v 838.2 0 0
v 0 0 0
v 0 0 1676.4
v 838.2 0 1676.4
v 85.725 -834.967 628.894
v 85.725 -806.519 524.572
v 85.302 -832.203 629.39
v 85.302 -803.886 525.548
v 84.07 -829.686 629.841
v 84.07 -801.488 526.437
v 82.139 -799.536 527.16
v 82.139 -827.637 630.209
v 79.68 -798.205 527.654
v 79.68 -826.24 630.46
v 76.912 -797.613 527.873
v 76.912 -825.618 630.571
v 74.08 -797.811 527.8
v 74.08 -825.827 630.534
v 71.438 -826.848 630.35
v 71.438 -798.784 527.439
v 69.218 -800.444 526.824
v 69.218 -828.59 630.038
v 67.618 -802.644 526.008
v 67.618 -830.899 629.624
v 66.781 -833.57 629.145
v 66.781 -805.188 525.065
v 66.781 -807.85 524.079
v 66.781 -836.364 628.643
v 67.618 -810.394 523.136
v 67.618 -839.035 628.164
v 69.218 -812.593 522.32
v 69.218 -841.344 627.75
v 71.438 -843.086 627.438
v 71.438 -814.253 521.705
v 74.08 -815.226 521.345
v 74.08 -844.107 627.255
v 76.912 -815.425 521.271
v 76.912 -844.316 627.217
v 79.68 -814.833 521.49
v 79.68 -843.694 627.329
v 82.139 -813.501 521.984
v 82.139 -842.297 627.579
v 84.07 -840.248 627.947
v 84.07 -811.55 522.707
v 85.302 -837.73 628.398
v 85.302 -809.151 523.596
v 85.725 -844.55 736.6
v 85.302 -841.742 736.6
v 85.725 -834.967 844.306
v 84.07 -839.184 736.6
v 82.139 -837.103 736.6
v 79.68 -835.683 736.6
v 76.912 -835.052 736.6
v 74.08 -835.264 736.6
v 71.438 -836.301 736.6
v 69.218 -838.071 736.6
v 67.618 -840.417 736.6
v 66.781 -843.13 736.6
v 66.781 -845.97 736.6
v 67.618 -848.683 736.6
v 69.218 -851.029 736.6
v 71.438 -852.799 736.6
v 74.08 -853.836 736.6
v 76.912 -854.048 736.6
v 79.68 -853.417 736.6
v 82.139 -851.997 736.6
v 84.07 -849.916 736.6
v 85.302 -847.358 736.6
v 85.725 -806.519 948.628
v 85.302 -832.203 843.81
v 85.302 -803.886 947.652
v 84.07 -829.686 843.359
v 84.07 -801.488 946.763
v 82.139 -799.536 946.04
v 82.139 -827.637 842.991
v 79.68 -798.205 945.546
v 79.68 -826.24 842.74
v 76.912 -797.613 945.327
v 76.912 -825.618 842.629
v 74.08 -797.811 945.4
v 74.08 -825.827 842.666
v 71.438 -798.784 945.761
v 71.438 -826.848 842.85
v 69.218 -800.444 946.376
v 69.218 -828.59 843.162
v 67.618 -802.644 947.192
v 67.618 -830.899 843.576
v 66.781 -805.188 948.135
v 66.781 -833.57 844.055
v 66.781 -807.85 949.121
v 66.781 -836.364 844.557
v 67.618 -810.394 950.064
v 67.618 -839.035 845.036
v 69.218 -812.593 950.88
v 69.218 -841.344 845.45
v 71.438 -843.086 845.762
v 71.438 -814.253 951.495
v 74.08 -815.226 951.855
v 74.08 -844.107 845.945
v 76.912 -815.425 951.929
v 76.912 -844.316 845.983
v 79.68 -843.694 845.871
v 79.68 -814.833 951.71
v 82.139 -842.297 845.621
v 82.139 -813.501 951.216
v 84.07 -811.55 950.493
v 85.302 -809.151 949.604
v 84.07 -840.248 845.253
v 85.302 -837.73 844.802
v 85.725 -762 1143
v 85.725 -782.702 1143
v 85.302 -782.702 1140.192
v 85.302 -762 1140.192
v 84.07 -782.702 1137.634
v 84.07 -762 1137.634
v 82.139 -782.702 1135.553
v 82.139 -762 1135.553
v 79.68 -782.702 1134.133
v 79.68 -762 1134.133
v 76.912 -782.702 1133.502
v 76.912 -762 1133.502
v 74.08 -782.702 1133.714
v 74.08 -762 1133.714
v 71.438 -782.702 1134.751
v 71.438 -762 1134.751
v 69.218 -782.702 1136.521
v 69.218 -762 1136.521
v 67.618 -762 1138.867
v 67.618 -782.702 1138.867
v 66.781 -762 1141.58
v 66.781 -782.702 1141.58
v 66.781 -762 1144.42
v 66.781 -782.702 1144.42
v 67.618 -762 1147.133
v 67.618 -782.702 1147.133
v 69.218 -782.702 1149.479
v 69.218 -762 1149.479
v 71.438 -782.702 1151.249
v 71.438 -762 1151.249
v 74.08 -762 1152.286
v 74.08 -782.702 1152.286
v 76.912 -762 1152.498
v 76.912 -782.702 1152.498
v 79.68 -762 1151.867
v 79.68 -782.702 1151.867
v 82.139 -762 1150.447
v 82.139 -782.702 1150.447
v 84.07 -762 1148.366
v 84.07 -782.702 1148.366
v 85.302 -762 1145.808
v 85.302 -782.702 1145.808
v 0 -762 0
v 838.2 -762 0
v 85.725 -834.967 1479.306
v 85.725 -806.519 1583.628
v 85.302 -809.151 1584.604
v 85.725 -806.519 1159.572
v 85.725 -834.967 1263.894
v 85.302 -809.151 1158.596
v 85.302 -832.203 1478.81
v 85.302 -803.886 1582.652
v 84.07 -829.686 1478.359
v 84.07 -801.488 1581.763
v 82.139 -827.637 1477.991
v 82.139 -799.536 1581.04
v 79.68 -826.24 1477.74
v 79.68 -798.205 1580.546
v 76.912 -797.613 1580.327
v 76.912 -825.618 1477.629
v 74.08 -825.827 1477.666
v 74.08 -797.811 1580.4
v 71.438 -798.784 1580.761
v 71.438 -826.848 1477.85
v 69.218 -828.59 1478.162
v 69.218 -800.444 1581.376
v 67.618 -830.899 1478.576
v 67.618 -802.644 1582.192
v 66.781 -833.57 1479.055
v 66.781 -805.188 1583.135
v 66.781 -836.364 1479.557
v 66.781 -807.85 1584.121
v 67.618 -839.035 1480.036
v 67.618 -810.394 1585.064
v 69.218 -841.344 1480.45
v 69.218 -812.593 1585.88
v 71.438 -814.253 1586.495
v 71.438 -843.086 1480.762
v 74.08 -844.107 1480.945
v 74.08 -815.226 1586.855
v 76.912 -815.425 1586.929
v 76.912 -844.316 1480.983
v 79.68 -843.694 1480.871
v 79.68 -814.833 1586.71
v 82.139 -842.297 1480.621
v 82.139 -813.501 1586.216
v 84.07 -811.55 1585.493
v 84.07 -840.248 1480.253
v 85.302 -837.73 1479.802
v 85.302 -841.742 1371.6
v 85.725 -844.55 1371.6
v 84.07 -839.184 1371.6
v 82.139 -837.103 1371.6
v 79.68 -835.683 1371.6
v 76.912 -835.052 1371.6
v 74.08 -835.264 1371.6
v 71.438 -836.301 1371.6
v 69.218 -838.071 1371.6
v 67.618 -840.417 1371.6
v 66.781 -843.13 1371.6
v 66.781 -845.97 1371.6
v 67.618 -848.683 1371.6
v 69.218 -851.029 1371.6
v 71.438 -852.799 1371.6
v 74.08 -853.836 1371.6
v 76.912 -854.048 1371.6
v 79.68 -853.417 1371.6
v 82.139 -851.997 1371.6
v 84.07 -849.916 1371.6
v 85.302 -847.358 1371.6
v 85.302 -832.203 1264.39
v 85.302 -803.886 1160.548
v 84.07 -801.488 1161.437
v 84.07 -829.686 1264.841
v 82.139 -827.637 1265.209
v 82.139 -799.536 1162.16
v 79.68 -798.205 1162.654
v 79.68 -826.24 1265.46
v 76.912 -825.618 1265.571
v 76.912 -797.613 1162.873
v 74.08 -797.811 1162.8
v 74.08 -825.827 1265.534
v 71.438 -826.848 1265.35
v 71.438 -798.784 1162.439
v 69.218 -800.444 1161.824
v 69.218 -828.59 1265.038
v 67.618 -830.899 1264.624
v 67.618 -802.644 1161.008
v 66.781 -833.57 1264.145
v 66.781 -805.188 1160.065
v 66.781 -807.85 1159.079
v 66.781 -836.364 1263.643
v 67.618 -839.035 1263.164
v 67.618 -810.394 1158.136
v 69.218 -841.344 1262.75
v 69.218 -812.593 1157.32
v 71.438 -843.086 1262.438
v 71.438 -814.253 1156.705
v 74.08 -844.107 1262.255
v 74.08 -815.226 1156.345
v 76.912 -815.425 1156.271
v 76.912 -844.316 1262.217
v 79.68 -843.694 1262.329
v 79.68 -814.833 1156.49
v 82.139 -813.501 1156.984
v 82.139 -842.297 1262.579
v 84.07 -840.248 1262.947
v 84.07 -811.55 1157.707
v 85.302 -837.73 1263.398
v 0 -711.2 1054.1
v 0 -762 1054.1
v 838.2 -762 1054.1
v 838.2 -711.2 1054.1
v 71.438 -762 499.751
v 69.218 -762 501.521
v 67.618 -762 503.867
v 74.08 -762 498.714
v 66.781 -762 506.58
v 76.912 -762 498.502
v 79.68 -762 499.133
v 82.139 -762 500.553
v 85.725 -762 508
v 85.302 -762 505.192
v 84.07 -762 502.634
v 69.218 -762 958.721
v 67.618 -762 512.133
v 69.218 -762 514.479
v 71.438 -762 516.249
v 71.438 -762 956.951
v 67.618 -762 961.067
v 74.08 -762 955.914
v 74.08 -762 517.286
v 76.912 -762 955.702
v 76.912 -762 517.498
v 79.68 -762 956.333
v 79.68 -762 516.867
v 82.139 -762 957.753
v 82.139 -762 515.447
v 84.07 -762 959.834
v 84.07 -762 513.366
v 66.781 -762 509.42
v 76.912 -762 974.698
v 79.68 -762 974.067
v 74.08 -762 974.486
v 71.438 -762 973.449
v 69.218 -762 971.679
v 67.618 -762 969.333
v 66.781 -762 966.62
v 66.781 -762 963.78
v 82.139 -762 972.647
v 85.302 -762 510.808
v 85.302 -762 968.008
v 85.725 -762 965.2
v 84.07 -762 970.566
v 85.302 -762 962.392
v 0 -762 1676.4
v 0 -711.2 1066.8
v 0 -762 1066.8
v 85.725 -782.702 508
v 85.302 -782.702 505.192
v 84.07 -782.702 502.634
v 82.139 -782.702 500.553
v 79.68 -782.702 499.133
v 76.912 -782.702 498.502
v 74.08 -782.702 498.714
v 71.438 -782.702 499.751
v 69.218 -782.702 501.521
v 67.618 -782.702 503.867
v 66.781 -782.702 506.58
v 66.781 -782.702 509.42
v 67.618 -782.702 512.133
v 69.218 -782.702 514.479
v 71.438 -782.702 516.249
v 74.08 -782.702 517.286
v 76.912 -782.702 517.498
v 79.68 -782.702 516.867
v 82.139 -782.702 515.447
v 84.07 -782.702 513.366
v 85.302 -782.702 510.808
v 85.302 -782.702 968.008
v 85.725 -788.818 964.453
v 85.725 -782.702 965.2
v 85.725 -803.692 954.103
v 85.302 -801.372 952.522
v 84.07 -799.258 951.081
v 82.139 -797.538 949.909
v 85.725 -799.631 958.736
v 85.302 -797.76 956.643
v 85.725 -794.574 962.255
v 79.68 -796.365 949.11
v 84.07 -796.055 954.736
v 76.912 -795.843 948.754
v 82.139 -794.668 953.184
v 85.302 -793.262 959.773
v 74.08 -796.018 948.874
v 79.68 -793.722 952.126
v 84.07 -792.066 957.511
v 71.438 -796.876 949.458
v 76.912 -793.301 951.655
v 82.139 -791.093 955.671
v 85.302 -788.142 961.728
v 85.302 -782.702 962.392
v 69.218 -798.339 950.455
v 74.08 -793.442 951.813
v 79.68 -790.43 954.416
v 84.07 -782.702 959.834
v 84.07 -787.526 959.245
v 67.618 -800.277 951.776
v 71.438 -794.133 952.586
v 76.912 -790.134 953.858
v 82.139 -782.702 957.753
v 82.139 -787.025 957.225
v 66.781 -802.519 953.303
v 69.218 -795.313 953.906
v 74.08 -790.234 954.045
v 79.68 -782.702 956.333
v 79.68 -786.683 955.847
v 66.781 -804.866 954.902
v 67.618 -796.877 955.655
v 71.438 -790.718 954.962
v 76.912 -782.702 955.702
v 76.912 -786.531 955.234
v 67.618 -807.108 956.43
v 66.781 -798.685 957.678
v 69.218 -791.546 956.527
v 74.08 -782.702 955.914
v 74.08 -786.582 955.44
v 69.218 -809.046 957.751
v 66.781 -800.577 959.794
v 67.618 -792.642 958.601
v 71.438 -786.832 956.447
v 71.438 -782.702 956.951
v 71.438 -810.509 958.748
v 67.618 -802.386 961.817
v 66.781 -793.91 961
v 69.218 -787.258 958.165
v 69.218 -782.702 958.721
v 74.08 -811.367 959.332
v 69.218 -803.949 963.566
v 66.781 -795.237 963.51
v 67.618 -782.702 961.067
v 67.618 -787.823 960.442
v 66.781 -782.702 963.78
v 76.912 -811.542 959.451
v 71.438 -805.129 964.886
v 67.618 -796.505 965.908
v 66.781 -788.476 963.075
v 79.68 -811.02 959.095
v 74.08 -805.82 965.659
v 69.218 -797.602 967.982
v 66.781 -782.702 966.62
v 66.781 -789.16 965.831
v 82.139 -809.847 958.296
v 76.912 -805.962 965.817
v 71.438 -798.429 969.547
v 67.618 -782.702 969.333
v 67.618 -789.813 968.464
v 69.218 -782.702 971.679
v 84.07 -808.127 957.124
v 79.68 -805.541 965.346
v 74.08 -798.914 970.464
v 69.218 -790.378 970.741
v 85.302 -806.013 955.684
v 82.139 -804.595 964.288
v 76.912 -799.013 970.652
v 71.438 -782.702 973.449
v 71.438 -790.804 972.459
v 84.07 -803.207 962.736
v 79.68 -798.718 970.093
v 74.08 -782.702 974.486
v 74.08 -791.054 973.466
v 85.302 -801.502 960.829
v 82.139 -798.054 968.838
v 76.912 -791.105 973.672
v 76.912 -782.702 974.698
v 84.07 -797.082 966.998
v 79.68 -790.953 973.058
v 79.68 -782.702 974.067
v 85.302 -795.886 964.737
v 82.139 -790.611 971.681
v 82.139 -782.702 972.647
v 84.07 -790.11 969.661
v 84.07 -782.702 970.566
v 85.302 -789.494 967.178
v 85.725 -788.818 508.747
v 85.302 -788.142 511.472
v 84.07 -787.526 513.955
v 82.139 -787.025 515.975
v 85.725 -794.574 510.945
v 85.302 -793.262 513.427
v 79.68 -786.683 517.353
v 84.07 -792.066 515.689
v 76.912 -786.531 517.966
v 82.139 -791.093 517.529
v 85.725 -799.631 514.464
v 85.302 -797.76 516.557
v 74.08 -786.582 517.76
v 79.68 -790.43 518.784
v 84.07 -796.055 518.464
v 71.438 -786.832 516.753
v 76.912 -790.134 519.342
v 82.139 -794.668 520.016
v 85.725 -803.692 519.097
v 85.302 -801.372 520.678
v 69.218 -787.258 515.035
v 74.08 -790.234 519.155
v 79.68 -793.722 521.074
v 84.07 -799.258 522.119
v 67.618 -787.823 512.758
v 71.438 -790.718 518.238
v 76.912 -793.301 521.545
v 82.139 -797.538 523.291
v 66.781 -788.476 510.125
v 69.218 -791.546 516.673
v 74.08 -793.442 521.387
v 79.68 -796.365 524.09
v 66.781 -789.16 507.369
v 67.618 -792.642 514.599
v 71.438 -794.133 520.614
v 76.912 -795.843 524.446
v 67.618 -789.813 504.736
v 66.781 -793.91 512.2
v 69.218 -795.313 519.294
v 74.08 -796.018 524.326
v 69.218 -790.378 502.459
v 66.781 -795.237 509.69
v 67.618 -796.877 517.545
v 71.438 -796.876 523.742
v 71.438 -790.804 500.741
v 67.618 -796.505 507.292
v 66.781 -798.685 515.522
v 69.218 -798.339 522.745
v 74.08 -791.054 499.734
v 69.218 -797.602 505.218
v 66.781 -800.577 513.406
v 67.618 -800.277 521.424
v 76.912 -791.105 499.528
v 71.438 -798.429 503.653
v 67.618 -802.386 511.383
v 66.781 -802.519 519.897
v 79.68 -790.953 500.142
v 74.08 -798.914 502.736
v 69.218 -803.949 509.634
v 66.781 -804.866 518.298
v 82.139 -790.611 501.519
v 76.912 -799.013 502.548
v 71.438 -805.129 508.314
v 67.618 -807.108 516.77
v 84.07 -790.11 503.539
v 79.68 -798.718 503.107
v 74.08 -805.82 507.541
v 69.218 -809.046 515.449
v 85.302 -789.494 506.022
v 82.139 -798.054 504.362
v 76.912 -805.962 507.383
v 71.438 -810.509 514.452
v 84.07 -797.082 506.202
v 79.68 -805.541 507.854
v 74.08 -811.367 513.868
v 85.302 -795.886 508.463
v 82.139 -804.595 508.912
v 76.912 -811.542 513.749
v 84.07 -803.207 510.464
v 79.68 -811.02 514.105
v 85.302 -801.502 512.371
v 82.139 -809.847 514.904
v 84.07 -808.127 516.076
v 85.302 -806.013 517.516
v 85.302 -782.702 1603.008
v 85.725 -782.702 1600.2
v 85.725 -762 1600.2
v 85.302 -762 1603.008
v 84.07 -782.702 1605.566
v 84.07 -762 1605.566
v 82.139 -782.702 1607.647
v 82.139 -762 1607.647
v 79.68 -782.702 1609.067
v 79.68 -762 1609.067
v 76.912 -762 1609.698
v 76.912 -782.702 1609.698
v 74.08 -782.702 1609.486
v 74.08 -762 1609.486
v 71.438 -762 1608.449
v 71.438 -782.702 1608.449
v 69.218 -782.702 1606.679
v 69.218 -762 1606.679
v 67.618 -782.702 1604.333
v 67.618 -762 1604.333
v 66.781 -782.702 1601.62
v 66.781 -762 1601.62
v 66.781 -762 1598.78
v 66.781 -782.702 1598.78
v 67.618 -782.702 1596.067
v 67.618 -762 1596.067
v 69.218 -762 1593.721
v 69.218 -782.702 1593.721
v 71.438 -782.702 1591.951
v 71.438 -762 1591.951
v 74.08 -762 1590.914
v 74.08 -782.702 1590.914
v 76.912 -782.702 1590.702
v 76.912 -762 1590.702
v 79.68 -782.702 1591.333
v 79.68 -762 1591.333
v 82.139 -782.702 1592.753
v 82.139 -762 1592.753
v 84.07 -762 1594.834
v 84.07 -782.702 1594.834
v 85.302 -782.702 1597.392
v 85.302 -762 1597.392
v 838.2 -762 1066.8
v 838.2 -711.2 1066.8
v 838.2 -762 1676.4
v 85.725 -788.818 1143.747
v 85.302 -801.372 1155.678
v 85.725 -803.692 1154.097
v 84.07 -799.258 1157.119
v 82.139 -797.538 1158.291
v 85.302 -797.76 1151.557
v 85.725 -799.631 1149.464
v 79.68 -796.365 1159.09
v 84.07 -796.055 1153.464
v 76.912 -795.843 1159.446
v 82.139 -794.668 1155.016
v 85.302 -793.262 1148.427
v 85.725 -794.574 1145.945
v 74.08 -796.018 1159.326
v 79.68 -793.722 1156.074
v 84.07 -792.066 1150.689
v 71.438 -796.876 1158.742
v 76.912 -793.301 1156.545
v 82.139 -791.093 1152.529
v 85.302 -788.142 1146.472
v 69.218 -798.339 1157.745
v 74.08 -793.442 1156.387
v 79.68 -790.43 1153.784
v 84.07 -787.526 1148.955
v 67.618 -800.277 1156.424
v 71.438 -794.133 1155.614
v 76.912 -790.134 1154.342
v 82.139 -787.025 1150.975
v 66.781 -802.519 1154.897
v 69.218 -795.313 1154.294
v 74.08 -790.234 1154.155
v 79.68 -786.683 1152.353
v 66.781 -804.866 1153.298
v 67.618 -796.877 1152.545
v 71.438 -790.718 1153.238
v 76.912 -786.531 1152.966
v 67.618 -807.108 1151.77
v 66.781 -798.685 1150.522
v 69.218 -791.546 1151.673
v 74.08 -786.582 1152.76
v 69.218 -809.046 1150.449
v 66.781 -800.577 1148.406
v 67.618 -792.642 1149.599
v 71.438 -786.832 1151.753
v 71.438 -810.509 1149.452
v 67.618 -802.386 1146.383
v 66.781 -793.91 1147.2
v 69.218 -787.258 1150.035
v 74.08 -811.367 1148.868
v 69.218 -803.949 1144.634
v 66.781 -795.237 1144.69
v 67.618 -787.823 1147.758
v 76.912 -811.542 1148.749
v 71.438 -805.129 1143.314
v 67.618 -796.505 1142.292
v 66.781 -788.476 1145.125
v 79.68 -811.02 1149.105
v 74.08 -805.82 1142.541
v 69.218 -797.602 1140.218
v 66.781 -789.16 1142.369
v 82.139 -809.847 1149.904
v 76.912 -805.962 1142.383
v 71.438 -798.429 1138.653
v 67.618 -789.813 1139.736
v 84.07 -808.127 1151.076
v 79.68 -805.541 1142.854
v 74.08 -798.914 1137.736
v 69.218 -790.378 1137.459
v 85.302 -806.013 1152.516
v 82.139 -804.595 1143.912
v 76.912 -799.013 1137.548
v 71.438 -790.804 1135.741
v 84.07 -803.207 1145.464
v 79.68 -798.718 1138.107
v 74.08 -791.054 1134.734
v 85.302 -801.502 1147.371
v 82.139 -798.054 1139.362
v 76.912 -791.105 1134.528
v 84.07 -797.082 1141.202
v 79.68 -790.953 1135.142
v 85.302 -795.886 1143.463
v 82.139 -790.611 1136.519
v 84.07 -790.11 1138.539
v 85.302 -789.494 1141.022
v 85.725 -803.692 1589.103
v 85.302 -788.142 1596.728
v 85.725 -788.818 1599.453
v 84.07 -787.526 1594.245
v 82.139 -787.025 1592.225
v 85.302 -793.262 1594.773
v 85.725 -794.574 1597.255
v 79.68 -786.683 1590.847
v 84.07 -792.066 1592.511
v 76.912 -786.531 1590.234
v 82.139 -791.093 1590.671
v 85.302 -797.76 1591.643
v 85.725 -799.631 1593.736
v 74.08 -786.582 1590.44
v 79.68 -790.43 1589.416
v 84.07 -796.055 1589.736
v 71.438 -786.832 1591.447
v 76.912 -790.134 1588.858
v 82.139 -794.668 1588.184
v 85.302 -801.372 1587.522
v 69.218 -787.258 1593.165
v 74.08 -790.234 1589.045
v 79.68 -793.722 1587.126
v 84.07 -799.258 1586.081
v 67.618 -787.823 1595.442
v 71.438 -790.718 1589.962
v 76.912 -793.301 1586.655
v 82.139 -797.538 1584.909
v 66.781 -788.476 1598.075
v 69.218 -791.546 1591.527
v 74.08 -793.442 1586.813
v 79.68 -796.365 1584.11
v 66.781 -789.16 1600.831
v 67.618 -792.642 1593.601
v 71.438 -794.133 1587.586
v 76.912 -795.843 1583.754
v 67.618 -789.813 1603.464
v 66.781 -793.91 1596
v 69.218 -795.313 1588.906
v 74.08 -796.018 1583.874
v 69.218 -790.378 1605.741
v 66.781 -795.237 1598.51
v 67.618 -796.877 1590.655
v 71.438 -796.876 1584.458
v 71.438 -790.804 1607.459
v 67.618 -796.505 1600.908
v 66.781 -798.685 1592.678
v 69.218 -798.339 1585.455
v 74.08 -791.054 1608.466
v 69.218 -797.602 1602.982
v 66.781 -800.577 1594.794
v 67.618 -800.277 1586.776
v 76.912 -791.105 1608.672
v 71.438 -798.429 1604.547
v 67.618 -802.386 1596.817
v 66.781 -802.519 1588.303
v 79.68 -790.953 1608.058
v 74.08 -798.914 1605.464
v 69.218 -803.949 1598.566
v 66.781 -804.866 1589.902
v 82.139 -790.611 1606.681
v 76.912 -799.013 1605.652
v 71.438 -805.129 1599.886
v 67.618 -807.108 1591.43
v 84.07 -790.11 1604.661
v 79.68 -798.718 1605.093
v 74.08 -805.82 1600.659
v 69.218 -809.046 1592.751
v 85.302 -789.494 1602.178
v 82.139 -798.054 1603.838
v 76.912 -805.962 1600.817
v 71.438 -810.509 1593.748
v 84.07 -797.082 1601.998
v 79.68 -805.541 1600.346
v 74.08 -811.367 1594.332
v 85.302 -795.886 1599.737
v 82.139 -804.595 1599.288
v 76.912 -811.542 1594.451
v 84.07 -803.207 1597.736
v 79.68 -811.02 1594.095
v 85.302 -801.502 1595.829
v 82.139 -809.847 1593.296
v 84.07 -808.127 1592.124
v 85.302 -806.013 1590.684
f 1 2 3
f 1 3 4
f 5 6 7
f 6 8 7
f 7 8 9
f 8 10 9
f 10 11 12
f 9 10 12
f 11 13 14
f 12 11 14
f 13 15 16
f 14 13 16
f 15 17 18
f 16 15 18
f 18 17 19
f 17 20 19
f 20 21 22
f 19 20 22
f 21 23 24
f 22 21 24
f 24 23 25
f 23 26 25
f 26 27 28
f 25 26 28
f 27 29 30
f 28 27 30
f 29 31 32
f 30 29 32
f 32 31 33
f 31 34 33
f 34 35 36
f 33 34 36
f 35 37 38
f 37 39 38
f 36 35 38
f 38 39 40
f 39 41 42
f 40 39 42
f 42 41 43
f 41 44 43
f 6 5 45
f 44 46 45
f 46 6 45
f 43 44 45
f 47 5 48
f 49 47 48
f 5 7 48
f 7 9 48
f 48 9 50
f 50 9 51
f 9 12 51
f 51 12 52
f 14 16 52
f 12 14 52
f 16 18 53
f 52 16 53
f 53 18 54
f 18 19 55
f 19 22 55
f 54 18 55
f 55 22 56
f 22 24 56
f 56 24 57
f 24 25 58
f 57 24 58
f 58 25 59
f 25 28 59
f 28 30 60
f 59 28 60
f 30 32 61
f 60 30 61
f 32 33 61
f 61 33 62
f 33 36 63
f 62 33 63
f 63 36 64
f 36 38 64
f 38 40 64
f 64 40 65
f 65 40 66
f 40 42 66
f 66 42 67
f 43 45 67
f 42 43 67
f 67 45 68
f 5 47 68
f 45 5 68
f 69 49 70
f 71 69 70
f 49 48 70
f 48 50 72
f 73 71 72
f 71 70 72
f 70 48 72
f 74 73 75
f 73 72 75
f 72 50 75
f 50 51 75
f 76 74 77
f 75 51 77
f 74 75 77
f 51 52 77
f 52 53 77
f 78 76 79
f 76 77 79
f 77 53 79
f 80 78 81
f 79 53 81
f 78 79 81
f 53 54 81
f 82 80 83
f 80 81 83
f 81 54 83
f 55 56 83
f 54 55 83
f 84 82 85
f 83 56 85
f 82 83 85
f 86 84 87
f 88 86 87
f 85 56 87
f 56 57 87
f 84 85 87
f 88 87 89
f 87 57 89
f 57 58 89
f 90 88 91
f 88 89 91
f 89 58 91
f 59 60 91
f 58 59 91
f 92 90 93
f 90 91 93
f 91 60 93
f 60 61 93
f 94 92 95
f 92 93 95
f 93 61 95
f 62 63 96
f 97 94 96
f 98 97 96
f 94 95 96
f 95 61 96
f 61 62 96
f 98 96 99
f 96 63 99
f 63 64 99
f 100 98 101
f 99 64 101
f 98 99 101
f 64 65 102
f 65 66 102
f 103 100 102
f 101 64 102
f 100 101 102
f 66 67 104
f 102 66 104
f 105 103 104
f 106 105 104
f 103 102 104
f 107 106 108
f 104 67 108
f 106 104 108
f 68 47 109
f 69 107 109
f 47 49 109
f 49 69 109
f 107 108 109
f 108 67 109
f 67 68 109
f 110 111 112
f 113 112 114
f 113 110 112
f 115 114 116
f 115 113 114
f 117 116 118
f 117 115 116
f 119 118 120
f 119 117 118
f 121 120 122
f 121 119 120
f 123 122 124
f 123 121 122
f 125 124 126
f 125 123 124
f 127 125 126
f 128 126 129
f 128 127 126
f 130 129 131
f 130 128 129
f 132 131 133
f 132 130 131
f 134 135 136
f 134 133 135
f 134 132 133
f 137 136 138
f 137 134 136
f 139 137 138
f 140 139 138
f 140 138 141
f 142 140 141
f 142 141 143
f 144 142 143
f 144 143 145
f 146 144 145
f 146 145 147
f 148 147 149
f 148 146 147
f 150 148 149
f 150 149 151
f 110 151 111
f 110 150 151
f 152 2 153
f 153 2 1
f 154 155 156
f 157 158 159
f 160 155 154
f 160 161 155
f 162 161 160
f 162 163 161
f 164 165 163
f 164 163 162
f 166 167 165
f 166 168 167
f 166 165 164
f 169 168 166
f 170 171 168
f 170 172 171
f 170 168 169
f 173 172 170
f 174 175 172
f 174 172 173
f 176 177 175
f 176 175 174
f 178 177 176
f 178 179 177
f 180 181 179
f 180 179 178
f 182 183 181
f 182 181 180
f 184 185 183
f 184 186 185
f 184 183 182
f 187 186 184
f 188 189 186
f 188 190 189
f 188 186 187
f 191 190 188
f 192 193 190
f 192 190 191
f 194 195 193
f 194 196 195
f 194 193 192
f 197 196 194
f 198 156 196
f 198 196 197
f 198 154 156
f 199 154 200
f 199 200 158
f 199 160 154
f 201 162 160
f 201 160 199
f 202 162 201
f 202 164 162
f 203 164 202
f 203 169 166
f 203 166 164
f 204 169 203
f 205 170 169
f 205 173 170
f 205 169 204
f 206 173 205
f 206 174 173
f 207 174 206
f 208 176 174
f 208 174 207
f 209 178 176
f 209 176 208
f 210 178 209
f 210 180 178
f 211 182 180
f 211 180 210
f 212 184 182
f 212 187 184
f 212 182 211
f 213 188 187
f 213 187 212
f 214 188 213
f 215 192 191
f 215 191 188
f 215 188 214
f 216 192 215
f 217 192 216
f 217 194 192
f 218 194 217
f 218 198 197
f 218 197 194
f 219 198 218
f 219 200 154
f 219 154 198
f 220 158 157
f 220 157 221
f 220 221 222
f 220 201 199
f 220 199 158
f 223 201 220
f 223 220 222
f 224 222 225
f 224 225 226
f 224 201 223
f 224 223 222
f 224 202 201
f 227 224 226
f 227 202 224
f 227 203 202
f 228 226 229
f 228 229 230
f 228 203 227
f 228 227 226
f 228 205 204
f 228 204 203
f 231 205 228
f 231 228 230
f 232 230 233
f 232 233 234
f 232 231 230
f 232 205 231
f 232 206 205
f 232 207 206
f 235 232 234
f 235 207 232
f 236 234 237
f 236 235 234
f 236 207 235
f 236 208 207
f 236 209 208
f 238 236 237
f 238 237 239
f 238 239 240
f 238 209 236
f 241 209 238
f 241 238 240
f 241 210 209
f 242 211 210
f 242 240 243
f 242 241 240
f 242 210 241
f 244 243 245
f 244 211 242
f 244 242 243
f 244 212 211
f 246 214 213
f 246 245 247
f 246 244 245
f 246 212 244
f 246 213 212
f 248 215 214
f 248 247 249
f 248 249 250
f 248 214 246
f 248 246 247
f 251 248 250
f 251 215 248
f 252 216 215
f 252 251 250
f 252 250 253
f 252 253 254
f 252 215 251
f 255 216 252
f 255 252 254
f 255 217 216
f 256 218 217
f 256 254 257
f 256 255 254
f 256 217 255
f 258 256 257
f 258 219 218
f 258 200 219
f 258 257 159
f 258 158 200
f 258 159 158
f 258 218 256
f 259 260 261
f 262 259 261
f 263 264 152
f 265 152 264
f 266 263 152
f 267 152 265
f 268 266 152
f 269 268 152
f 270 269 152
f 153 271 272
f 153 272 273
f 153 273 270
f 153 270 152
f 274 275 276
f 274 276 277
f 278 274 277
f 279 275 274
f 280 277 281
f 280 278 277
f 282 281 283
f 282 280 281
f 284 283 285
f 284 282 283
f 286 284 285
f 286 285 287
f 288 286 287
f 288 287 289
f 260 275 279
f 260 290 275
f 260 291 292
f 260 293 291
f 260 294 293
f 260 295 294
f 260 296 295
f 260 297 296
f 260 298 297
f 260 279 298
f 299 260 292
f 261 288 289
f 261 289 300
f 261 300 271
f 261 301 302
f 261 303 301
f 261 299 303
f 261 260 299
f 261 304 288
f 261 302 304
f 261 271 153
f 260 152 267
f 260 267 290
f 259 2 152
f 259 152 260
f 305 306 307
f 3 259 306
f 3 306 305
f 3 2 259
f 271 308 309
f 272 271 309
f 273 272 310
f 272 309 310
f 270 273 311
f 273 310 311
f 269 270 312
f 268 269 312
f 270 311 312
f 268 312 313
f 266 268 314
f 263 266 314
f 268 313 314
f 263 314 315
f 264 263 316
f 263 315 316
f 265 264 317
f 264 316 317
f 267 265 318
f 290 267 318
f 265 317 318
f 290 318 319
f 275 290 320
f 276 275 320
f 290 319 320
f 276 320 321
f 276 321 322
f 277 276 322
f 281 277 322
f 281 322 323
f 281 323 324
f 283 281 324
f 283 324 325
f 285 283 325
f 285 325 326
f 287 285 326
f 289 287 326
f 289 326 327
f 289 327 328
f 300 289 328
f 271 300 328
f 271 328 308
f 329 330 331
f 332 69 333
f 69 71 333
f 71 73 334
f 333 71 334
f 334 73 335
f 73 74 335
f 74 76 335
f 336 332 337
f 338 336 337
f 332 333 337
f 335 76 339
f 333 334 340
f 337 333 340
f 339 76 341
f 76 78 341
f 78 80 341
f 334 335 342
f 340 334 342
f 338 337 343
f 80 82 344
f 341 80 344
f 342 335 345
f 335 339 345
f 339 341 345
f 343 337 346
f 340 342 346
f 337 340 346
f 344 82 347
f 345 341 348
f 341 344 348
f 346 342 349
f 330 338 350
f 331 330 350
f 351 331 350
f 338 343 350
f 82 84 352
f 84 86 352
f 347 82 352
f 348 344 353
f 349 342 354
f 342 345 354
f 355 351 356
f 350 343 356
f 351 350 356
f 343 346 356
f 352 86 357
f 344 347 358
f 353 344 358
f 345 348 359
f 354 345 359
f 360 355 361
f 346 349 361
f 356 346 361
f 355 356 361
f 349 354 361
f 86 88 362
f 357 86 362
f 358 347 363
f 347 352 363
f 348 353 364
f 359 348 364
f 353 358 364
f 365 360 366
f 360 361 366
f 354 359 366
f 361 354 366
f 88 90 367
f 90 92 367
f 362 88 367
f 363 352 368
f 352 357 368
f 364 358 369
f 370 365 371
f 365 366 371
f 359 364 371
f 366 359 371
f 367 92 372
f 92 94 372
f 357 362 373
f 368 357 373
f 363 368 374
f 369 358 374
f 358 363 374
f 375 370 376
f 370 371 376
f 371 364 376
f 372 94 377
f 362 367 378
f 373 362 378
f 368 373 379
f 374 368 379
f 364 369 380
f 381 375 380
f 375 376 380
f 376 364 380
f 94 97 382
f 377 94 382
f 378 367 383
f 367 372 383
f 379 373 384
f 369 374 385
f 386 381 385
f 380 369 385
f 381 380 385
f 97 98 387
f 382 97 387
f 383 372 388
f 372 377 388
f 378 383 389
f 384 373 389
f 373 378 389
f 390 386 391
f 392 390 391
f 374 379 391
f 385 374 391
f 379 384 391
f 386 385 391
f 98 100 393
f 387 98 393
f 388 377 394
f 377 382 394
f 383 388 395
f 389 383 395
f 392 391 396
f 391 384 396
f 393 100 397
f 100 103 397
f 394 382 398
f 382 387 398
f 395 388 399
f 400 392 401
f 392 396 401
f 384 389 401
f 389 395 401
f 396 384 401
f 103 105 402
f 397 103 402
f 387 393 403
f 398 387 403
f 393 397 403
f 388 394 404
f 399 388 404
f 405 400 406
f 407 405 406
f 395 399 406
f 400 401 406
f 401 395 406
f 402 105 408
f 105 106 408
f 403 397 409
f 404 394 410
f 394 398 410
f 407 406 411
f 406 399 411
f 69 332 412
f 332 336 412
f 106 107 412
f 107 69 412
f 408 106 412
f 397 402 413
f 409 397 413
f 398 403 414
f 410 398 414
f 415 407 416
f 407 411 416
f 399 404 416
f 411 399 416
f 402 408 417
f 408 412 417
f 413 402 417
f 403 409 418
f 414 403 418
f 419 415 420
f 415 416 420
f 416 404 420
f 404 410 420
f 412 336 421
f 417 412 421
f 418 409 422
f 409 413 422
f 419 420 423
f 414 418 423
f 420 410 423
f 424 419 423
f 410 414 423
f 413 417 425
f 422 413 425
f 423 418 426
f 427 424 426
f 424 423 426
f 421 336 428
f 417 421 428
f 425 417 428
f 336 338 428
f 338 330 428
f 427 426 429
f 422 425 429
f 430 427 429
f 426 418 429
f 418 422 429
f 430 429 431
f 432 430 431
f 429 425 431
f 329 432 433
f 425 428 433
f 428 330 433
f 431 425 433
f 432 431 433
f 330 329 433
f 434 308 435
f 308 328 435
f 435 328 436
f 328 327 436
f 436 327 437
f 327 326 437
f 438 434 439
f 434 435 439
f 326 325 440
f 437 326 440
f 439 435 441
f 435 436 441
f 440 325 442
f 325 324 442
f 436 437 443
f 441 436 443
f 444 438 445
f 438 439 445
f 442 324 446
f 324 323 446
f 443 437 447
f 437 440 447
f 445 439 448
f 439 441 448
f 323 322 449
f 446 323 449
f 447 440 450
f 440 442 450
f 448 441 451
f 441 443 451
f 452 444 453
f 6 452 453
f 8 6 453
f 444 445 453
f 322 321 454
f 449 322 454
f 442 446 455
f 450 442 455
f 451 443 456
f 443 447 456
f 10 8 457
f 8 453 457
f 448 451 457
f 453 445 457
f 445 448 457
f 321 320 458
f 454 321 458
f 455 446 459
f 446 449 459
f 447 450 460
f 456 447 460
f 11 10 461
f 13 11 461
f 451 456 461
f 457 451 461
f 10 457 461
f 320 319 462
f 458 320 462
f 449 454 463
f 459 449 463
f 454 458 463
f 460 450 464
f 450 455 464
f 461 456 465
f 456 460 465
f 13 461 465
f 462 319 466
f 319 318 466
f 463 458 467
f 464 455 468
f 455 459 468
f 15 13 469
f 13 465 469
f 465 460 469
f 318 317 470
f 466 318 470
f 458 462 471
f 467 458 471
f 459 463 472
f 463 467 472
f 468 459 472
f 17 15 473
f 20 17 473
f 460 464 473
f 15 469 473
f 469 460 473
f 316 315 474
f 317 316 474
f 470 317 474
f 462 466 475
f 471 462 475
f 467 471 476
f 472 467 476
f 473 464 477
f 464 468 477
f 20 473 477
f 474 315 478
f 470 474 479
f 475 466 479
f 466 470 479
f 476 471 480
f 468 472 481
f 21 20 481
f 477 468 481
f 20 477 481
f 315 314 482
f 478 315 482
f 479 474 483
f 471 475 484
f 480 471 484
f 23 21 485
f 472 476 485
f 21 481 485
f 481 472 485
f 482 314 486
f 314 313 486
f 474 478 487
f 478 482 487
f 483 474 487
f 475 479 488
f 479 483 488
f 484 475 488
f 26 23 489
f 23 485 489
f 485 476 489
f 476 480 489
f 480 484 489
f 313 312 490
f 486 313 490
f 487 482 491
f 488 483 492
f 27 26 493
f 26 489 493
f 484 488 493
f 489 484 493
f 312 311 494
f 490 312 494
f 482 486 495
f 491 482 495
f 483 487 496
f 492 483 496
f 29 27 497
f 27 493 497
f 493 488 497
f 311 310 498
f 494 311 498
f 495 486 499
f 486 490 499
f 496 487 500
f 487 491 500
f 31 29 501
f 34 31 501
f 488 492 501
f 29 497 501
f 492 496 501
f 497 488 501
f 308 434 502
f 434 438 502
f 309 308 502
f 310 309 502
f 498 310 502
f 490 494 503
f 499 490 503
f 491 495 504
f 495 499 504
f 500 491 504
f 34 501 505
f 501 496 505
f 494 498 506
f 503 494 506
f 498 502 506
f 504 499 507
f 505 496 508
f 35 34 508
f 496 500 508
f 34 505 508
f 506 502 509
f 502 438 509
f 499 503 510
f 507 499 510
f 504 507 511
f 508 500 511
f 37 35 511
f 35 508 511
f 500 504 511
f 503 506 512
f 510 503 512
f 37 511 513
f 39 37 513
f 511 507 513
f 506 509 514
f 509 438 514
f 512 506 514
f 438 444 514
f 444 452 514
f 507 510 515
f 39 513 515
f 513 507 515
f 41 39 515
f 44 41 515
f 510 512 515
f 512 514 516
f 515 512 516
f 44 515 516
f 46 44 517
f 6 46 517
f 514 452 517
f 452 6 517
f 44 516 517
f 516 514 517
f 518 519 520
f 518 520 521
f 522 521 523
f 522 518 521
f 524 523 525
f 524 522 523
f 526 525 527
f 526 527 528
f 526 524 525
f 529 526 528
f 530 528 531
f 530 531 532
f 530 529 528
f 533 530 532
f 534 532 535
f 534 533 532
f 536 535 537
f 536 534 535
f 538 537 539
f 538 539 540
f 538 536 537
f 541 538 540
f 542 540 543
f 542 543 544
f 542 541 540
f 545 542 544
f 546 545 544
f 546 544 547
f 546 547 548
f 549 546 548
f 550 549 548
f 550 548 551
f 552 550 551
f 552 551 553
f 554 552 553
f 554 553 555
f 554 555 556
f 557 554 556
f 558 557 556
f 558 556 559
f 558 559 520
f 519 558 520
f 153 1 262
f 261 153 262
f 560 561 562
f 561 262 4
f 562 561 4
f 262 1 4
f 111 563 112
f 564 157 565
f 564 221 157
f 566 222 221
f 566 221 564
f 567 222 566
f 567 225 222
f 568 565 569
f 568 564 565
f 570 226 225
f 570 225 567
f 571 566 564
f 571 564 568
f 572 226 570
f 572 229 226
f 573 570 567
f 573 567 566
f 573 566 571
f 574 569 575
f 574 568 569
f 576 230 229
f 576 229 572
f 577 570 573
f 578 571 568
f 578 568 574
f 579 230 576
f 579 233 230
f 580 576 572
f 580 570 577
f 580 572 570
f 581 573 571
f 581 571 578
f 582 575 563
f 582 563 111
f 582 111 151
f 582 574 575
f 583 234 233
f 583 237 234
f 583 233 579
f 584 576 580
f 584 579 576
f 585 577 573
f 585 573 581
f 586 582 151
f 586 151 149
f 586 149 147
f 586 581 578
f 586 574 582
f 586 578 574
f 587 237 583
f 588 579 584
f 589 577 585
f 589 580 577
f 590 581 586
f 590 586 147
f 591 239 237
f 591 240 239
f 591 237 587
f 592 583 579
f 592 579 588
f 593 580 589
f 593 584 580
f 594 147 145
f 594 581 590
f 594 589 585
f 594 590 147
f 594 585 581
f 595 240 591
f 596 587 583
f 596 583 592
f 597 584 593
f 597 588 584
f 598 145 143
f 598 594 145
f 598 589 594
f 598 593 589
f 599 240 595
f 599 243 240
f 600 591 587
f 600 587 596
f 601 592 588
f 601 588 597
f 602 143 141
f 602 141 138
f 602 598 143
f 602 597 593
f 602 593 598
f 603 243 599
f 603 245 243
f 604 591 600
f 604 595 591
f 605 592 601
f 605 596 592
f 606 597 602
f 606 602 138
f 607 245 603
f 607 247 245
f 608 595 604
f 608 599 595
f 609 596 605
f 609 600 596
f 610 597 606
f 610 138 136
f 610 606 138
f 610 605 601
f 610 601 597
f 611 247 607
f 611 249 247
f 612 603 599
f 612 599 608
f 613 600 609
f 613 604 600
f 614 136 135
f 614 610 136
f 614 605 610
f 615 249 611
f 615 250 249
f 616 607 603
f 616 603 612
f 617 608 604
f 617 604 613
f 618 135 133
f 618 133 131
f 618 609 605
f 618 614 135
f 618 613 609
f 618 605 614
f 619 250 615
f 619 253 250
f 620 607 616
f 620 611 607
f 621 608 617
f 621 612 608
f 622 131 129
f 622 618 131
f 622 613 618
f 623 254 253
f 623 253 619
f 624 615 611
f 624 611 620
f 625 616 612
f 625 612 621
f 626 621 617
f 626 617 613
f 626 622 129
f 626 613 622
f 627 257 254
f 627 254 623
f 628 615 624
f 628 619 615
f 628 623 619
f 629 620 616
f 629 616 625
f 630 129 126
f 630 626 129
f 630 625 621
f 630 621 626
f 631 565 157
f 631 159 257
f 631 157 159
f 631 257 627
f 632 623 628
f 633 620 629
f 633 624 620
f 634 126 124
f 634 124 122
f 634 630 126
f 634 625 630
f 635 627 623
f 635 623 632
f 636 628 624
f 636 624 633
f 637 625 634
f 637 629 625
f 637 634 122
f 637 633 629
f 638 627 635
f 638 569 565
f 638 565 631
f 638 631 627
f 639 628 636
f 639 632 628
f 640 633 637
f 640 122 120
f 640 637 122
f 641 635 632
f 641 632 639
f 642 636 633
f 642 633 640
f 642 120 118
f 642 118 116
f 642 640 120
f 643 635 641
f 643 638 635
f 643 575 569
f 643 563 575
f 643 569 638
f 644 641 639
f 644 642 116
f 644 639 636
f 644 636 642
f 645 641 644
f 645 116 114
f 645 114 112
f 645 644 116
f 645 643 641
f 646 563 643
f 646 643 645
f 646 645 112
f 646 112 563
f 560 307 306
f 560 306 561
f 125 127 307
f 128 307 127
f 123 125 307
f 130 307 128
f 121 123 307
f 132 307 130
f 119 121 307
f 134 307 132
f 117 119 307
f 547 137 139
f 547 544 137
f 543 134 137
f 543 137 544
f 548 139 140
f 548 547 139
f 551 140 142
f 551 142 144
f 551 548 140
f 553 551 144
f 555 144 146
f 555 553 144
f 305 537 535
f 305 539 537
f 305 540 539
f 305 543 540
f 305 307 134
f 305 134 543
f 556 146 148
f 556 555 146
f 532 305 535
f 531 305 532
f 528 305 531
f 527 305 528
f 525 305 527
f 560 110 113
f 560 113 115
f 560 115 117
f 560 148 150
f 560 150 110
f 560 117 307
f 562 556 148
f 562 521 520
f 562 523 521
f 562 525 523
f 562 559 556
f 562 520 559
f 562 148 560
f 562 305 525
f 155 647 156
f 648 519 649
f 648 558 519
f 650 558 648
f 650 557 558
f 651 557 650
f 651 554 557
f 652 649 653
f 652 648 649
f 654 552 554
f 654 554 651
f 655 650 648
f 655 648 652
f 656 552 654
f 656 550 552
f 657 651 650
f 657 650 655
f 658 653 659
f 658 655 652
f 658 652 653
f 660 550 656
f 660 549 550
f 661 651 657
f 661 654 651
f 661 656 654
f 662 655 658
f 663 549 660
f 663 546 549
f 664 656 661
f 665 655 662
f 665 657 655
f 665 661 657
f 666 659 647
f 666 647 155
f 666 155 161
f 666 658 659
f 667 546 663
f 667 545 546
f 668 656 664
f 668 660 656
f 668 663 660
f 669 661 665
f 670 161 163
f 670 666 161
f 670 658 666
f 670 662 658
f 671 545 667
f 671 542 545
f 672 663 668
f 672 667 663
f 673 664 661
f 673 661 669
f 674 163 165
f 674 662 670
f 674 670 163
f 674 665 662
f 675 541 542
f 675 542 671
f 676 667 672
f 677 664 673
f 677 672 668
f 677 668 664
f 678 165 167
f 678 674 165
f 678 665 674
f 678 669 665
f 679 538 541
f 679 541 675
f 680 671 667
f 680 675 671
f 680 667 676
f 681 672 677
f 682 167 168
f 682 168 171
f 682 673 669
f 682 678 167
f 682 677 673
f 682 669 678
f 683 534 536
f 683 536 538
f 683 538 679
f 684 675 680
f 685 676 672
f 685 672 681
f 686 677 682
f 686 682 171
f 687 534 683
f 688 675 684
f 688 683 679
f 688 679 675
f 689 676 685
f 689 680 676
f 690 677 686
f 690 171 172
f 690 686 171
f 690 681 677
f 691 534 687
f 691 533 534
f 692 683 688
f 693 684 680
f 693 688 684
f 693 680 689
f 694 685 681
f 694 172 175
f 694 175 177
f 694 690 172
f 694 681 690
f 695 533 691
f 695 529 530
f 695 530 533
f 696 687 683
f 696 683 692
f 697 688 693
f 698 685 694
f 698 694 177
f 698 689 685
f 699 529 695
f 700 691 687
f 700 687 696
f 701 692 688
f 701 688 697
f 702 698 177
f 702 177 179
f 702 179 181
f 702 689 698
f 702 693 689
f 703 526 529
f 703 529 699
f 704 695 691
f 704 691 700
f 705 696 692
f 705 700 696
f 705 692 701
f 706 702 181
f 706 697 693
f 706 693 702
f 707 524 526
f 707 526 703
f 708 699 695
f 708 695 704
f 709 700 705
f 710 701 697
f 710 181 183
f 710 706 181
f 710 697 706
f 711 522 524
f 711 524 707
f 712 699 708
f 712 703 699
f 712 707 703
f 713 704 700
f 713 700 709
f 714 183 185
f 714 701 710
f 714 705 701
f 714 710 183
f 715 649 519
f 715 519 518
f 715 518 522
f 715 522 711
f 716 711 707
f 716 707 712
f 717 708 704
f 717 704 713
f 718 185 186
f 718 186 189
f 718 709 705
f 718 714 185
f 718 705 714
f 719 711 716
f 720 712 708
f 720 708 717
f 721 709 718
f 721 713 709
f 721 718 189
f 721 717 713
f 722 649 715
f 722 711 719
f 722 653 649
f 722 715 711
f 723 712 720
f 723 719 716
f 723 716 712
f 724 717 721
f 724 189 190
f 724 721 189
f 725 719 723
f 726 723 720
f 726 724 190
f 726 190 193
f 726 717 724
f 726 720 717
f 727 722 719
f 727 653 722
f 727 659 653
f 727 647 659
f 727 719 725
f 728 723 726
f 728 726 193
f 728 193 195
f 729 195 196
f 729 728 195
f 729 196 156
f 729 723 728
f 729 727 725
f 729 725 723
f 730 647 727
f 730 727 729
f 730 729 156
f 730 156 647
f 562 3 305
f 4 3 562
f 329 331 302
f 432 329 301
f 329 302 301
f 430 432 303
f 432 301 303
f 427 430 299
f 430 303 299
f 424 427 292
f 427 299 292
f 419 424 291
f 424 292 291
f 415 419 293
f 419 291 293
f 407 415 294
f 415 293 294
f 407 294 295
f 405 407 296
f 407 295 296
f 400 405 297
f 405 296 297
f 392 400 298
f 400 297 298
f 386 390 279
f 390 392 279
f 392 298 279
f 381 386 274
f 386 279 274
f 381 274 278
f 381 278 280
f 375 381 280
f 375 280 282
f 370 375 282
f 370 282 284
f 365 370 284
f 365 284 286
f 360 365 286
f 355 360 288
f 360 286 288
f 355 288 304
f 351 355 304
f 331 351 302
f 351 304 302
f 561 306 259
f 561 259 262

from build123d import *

# Parameters (mm, degrees)
F0_W     = 838.2
F0_H     = 1676.4
F1_DEPTH = 762
F2_W     = 838.2
F2_H     = 12.7
F3_DEPTH = 50.8
F5_R     = 9.525


with BuildPart() as f1:
    # F0 (on Front) → F1 (new body)
    with BuildSketch(Plane.XZ):
        with Locations((419.1, 838.2)):
            Rectangle(F0_W, F0_H)
    extrude(amount=F1_DEPTH)

    # F2 (on face) → F3 (cut)
    with BuildSketch(Plane.XZ.offset(762)):
        with Locations((419.1, 1060.45)):
            Rectangle(F2_W, F2_H)
    extrude(amount=-F3_DEPTH, mode=Mode.SUBTRACT)

    # F7: sweep along a path in F6
    with BuildLine(Plane(origin=(76.2, 0, 0), x_dir=(0, -1, 0), z_dir=(-1, 0, 0))) as f7_path:
        Line((762, 1600.2), (782.7021915694, 1600.2))
        ThreePointArc((782.7021915694, 1600.2), (797.2096140296, 1595.6493331683), (806.5187336391, 1583.6279286268))
        ThreePointArc((806.5187336391, 1583.6279286268), (844.55, 1371.6), (806.5187336391, 1159.5720713732))
        ThreePointArc((806.5187336391, 1159.5720713732), (797.2096140296, 1147.5506668317), (782.7021915694, 1143))
        Line((782.7021915694, 1143), (762, 1143))
    # F5 (on face) → F7 (sweep)
    with BuildSketch(Plane.XZ.offset(762)):
        with Locations((76.2, 1600.2)):
            Circle(F5_R)
    f7 = sweep(path=f7_path.line)

    # F8: F7 across face
    add(f7.mirror(Plane(origin=(419.1, -736.6, 1054.1), x_dir=(1, 0, 0), z_dir=(0, 0, 1))))


solid = f1.part
